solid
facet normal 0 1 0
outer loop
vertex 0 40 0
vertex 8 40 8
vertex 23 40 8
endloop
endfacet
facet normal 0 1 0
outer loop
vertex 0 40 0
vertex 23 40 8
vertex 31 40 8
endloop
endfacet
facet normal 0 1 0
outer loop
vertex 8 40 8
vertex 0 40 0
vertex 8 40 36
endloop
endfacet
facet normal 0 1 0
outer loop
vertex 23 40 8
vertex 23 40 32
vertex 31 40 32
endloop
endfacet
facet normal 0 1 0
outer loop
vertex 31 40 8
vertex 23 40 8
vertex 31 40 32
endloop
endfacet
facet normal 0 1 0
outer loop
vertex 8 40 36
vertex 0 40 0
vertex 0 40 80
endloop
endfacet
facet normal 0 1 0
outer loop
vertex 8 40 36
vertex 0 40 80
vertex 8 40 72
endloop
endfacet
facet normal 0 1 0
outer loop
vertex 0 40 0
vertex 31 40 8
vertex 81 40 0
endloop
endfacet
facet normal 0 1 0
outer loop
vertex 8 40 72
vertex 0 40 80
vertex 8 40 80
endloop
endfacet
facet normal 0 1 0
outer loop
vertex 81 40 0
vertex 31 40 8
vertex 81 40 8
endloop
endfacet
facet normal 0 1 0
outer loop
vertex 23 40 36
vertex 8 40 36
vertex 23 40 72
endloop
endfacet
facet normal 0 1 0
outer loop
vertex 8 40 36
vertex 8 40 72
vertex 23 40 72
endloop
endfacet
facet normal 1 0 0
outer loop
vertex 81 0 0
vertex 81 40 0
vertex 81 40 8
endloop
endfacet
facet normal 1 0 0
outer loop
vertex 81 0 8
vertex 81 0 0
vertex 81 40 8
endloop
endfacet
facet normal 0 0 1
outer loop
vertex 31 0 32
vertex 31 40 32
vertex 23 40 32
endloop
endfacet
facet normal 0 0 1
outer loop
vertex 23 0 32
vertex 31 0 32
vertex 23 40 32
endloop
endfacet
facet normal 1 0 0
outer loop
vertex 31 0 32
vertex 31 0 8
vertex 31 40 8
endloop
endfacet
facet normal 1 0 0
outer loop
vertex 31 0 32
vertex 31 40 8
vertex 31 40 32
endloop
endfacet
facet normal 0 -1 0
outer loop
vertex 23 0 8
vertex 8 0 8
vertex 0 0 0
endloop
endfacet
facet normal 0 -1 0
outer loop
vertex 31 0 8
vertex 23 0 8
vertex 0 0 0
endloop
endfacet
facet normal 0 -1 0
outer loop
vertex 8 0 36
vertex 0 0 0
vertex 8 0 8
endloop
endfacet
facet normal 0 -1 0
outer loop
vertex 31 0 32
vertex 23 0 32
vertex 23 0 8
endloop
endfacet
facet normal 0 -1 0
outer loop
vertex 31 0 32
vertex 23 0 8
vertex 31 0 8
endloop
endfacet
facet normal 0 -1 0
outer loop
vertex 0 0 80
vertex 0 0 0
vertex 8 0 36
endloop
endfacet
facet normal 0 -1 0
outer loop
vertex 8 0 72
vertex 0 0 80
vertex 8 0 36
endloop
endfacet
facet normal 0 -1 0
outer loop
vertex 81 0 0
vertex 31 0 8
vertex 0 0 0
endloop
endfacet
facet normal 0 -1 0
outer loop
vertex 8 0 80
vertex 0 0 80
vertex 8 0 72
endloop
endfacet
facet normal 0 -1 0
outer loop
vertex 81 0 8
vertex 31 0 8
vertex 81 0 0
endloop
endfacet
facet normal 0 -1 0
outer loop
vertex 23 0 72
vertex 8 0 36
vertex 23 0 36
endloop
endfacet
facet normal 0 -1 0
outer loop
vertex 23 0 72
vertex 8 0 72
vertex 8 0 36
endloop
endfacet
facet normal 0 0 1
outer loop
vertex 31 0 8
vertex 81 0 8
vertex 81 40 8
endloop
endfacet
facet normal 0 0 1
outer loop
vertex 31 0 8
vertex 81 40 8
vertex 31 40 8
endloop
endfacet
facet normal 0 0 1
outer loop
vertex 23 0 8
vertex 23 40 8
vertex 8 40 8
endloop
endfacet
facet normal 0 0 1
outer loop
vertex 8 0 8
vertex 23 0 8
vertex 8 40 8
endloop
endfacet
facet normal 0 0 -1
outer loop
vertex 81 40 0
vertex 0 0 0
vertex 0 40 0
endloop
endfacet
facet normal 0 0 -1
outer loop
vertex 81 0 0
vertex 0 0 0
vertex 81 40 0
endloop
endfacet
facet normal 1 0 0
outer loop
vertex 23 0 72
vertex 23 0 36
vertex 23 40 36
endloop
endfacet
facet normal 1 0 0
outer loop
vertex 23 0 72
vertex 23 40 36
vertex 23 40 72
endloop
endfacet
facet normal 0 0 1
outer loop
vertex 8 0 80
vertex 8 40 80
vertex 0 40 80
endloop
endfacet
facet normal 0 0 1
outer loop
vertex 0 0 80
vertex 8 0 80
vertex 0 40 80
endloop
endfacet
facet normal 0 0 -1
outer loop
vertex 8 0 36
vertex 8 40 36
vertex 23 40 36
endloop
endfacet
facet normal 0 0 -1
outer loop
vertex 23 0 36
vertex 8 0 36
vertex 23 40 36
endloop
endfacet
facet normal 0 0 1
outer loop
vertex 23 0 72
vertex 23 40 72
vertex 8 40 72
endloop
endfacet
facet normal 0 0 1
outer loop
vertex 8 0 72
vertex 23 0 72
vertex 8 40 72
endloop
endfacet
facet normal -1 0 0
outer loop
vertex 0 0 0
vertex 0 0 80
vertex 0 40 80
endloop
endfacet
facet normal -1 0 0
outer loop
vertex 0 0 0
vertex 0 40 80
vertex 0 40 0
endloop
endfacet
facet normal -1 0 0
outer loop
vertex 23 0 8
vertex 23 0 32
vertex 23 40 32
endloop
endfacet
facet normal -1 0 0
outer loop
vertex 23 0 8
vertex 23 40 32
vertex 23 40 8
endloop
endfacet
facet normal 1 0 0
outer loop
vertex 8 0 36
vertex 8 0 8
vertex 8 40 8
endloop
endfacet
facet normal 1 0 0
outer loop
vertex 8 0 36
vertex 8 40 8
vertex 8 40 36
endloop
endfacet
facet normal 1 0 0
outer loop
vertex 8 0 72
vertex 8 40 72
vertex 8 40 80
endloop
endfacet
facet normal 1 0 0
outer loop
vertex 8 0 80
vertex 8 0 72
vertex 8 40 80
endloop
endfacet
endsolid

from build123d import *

# Parameters (mm, degrees)
F1_DEPTH = 40


# Not quite as in the source:
# - a feature names something its author has since deleted; it is built from what else it names


with BuildPart() as f1:
    # F0 (on Front) → F1 (new body)
    with BuildSketch(Plane.XZ):
        Polygon((23, 72), (8, 72), (8, 39.8151502013), (8, 36), (23, 36), align=None)
        Polygon((0, 80), (0, 0), (81, 0), (81, 8), (56, 8), (31, 8), (31, 32), (23, 32), (23, 8), (8, 8), (8, 36), (8, 39.8151502013), (8, 72), (8, 80), align=None)
    extrude(amount=-F1_DEPTH)


solid = f1.part
